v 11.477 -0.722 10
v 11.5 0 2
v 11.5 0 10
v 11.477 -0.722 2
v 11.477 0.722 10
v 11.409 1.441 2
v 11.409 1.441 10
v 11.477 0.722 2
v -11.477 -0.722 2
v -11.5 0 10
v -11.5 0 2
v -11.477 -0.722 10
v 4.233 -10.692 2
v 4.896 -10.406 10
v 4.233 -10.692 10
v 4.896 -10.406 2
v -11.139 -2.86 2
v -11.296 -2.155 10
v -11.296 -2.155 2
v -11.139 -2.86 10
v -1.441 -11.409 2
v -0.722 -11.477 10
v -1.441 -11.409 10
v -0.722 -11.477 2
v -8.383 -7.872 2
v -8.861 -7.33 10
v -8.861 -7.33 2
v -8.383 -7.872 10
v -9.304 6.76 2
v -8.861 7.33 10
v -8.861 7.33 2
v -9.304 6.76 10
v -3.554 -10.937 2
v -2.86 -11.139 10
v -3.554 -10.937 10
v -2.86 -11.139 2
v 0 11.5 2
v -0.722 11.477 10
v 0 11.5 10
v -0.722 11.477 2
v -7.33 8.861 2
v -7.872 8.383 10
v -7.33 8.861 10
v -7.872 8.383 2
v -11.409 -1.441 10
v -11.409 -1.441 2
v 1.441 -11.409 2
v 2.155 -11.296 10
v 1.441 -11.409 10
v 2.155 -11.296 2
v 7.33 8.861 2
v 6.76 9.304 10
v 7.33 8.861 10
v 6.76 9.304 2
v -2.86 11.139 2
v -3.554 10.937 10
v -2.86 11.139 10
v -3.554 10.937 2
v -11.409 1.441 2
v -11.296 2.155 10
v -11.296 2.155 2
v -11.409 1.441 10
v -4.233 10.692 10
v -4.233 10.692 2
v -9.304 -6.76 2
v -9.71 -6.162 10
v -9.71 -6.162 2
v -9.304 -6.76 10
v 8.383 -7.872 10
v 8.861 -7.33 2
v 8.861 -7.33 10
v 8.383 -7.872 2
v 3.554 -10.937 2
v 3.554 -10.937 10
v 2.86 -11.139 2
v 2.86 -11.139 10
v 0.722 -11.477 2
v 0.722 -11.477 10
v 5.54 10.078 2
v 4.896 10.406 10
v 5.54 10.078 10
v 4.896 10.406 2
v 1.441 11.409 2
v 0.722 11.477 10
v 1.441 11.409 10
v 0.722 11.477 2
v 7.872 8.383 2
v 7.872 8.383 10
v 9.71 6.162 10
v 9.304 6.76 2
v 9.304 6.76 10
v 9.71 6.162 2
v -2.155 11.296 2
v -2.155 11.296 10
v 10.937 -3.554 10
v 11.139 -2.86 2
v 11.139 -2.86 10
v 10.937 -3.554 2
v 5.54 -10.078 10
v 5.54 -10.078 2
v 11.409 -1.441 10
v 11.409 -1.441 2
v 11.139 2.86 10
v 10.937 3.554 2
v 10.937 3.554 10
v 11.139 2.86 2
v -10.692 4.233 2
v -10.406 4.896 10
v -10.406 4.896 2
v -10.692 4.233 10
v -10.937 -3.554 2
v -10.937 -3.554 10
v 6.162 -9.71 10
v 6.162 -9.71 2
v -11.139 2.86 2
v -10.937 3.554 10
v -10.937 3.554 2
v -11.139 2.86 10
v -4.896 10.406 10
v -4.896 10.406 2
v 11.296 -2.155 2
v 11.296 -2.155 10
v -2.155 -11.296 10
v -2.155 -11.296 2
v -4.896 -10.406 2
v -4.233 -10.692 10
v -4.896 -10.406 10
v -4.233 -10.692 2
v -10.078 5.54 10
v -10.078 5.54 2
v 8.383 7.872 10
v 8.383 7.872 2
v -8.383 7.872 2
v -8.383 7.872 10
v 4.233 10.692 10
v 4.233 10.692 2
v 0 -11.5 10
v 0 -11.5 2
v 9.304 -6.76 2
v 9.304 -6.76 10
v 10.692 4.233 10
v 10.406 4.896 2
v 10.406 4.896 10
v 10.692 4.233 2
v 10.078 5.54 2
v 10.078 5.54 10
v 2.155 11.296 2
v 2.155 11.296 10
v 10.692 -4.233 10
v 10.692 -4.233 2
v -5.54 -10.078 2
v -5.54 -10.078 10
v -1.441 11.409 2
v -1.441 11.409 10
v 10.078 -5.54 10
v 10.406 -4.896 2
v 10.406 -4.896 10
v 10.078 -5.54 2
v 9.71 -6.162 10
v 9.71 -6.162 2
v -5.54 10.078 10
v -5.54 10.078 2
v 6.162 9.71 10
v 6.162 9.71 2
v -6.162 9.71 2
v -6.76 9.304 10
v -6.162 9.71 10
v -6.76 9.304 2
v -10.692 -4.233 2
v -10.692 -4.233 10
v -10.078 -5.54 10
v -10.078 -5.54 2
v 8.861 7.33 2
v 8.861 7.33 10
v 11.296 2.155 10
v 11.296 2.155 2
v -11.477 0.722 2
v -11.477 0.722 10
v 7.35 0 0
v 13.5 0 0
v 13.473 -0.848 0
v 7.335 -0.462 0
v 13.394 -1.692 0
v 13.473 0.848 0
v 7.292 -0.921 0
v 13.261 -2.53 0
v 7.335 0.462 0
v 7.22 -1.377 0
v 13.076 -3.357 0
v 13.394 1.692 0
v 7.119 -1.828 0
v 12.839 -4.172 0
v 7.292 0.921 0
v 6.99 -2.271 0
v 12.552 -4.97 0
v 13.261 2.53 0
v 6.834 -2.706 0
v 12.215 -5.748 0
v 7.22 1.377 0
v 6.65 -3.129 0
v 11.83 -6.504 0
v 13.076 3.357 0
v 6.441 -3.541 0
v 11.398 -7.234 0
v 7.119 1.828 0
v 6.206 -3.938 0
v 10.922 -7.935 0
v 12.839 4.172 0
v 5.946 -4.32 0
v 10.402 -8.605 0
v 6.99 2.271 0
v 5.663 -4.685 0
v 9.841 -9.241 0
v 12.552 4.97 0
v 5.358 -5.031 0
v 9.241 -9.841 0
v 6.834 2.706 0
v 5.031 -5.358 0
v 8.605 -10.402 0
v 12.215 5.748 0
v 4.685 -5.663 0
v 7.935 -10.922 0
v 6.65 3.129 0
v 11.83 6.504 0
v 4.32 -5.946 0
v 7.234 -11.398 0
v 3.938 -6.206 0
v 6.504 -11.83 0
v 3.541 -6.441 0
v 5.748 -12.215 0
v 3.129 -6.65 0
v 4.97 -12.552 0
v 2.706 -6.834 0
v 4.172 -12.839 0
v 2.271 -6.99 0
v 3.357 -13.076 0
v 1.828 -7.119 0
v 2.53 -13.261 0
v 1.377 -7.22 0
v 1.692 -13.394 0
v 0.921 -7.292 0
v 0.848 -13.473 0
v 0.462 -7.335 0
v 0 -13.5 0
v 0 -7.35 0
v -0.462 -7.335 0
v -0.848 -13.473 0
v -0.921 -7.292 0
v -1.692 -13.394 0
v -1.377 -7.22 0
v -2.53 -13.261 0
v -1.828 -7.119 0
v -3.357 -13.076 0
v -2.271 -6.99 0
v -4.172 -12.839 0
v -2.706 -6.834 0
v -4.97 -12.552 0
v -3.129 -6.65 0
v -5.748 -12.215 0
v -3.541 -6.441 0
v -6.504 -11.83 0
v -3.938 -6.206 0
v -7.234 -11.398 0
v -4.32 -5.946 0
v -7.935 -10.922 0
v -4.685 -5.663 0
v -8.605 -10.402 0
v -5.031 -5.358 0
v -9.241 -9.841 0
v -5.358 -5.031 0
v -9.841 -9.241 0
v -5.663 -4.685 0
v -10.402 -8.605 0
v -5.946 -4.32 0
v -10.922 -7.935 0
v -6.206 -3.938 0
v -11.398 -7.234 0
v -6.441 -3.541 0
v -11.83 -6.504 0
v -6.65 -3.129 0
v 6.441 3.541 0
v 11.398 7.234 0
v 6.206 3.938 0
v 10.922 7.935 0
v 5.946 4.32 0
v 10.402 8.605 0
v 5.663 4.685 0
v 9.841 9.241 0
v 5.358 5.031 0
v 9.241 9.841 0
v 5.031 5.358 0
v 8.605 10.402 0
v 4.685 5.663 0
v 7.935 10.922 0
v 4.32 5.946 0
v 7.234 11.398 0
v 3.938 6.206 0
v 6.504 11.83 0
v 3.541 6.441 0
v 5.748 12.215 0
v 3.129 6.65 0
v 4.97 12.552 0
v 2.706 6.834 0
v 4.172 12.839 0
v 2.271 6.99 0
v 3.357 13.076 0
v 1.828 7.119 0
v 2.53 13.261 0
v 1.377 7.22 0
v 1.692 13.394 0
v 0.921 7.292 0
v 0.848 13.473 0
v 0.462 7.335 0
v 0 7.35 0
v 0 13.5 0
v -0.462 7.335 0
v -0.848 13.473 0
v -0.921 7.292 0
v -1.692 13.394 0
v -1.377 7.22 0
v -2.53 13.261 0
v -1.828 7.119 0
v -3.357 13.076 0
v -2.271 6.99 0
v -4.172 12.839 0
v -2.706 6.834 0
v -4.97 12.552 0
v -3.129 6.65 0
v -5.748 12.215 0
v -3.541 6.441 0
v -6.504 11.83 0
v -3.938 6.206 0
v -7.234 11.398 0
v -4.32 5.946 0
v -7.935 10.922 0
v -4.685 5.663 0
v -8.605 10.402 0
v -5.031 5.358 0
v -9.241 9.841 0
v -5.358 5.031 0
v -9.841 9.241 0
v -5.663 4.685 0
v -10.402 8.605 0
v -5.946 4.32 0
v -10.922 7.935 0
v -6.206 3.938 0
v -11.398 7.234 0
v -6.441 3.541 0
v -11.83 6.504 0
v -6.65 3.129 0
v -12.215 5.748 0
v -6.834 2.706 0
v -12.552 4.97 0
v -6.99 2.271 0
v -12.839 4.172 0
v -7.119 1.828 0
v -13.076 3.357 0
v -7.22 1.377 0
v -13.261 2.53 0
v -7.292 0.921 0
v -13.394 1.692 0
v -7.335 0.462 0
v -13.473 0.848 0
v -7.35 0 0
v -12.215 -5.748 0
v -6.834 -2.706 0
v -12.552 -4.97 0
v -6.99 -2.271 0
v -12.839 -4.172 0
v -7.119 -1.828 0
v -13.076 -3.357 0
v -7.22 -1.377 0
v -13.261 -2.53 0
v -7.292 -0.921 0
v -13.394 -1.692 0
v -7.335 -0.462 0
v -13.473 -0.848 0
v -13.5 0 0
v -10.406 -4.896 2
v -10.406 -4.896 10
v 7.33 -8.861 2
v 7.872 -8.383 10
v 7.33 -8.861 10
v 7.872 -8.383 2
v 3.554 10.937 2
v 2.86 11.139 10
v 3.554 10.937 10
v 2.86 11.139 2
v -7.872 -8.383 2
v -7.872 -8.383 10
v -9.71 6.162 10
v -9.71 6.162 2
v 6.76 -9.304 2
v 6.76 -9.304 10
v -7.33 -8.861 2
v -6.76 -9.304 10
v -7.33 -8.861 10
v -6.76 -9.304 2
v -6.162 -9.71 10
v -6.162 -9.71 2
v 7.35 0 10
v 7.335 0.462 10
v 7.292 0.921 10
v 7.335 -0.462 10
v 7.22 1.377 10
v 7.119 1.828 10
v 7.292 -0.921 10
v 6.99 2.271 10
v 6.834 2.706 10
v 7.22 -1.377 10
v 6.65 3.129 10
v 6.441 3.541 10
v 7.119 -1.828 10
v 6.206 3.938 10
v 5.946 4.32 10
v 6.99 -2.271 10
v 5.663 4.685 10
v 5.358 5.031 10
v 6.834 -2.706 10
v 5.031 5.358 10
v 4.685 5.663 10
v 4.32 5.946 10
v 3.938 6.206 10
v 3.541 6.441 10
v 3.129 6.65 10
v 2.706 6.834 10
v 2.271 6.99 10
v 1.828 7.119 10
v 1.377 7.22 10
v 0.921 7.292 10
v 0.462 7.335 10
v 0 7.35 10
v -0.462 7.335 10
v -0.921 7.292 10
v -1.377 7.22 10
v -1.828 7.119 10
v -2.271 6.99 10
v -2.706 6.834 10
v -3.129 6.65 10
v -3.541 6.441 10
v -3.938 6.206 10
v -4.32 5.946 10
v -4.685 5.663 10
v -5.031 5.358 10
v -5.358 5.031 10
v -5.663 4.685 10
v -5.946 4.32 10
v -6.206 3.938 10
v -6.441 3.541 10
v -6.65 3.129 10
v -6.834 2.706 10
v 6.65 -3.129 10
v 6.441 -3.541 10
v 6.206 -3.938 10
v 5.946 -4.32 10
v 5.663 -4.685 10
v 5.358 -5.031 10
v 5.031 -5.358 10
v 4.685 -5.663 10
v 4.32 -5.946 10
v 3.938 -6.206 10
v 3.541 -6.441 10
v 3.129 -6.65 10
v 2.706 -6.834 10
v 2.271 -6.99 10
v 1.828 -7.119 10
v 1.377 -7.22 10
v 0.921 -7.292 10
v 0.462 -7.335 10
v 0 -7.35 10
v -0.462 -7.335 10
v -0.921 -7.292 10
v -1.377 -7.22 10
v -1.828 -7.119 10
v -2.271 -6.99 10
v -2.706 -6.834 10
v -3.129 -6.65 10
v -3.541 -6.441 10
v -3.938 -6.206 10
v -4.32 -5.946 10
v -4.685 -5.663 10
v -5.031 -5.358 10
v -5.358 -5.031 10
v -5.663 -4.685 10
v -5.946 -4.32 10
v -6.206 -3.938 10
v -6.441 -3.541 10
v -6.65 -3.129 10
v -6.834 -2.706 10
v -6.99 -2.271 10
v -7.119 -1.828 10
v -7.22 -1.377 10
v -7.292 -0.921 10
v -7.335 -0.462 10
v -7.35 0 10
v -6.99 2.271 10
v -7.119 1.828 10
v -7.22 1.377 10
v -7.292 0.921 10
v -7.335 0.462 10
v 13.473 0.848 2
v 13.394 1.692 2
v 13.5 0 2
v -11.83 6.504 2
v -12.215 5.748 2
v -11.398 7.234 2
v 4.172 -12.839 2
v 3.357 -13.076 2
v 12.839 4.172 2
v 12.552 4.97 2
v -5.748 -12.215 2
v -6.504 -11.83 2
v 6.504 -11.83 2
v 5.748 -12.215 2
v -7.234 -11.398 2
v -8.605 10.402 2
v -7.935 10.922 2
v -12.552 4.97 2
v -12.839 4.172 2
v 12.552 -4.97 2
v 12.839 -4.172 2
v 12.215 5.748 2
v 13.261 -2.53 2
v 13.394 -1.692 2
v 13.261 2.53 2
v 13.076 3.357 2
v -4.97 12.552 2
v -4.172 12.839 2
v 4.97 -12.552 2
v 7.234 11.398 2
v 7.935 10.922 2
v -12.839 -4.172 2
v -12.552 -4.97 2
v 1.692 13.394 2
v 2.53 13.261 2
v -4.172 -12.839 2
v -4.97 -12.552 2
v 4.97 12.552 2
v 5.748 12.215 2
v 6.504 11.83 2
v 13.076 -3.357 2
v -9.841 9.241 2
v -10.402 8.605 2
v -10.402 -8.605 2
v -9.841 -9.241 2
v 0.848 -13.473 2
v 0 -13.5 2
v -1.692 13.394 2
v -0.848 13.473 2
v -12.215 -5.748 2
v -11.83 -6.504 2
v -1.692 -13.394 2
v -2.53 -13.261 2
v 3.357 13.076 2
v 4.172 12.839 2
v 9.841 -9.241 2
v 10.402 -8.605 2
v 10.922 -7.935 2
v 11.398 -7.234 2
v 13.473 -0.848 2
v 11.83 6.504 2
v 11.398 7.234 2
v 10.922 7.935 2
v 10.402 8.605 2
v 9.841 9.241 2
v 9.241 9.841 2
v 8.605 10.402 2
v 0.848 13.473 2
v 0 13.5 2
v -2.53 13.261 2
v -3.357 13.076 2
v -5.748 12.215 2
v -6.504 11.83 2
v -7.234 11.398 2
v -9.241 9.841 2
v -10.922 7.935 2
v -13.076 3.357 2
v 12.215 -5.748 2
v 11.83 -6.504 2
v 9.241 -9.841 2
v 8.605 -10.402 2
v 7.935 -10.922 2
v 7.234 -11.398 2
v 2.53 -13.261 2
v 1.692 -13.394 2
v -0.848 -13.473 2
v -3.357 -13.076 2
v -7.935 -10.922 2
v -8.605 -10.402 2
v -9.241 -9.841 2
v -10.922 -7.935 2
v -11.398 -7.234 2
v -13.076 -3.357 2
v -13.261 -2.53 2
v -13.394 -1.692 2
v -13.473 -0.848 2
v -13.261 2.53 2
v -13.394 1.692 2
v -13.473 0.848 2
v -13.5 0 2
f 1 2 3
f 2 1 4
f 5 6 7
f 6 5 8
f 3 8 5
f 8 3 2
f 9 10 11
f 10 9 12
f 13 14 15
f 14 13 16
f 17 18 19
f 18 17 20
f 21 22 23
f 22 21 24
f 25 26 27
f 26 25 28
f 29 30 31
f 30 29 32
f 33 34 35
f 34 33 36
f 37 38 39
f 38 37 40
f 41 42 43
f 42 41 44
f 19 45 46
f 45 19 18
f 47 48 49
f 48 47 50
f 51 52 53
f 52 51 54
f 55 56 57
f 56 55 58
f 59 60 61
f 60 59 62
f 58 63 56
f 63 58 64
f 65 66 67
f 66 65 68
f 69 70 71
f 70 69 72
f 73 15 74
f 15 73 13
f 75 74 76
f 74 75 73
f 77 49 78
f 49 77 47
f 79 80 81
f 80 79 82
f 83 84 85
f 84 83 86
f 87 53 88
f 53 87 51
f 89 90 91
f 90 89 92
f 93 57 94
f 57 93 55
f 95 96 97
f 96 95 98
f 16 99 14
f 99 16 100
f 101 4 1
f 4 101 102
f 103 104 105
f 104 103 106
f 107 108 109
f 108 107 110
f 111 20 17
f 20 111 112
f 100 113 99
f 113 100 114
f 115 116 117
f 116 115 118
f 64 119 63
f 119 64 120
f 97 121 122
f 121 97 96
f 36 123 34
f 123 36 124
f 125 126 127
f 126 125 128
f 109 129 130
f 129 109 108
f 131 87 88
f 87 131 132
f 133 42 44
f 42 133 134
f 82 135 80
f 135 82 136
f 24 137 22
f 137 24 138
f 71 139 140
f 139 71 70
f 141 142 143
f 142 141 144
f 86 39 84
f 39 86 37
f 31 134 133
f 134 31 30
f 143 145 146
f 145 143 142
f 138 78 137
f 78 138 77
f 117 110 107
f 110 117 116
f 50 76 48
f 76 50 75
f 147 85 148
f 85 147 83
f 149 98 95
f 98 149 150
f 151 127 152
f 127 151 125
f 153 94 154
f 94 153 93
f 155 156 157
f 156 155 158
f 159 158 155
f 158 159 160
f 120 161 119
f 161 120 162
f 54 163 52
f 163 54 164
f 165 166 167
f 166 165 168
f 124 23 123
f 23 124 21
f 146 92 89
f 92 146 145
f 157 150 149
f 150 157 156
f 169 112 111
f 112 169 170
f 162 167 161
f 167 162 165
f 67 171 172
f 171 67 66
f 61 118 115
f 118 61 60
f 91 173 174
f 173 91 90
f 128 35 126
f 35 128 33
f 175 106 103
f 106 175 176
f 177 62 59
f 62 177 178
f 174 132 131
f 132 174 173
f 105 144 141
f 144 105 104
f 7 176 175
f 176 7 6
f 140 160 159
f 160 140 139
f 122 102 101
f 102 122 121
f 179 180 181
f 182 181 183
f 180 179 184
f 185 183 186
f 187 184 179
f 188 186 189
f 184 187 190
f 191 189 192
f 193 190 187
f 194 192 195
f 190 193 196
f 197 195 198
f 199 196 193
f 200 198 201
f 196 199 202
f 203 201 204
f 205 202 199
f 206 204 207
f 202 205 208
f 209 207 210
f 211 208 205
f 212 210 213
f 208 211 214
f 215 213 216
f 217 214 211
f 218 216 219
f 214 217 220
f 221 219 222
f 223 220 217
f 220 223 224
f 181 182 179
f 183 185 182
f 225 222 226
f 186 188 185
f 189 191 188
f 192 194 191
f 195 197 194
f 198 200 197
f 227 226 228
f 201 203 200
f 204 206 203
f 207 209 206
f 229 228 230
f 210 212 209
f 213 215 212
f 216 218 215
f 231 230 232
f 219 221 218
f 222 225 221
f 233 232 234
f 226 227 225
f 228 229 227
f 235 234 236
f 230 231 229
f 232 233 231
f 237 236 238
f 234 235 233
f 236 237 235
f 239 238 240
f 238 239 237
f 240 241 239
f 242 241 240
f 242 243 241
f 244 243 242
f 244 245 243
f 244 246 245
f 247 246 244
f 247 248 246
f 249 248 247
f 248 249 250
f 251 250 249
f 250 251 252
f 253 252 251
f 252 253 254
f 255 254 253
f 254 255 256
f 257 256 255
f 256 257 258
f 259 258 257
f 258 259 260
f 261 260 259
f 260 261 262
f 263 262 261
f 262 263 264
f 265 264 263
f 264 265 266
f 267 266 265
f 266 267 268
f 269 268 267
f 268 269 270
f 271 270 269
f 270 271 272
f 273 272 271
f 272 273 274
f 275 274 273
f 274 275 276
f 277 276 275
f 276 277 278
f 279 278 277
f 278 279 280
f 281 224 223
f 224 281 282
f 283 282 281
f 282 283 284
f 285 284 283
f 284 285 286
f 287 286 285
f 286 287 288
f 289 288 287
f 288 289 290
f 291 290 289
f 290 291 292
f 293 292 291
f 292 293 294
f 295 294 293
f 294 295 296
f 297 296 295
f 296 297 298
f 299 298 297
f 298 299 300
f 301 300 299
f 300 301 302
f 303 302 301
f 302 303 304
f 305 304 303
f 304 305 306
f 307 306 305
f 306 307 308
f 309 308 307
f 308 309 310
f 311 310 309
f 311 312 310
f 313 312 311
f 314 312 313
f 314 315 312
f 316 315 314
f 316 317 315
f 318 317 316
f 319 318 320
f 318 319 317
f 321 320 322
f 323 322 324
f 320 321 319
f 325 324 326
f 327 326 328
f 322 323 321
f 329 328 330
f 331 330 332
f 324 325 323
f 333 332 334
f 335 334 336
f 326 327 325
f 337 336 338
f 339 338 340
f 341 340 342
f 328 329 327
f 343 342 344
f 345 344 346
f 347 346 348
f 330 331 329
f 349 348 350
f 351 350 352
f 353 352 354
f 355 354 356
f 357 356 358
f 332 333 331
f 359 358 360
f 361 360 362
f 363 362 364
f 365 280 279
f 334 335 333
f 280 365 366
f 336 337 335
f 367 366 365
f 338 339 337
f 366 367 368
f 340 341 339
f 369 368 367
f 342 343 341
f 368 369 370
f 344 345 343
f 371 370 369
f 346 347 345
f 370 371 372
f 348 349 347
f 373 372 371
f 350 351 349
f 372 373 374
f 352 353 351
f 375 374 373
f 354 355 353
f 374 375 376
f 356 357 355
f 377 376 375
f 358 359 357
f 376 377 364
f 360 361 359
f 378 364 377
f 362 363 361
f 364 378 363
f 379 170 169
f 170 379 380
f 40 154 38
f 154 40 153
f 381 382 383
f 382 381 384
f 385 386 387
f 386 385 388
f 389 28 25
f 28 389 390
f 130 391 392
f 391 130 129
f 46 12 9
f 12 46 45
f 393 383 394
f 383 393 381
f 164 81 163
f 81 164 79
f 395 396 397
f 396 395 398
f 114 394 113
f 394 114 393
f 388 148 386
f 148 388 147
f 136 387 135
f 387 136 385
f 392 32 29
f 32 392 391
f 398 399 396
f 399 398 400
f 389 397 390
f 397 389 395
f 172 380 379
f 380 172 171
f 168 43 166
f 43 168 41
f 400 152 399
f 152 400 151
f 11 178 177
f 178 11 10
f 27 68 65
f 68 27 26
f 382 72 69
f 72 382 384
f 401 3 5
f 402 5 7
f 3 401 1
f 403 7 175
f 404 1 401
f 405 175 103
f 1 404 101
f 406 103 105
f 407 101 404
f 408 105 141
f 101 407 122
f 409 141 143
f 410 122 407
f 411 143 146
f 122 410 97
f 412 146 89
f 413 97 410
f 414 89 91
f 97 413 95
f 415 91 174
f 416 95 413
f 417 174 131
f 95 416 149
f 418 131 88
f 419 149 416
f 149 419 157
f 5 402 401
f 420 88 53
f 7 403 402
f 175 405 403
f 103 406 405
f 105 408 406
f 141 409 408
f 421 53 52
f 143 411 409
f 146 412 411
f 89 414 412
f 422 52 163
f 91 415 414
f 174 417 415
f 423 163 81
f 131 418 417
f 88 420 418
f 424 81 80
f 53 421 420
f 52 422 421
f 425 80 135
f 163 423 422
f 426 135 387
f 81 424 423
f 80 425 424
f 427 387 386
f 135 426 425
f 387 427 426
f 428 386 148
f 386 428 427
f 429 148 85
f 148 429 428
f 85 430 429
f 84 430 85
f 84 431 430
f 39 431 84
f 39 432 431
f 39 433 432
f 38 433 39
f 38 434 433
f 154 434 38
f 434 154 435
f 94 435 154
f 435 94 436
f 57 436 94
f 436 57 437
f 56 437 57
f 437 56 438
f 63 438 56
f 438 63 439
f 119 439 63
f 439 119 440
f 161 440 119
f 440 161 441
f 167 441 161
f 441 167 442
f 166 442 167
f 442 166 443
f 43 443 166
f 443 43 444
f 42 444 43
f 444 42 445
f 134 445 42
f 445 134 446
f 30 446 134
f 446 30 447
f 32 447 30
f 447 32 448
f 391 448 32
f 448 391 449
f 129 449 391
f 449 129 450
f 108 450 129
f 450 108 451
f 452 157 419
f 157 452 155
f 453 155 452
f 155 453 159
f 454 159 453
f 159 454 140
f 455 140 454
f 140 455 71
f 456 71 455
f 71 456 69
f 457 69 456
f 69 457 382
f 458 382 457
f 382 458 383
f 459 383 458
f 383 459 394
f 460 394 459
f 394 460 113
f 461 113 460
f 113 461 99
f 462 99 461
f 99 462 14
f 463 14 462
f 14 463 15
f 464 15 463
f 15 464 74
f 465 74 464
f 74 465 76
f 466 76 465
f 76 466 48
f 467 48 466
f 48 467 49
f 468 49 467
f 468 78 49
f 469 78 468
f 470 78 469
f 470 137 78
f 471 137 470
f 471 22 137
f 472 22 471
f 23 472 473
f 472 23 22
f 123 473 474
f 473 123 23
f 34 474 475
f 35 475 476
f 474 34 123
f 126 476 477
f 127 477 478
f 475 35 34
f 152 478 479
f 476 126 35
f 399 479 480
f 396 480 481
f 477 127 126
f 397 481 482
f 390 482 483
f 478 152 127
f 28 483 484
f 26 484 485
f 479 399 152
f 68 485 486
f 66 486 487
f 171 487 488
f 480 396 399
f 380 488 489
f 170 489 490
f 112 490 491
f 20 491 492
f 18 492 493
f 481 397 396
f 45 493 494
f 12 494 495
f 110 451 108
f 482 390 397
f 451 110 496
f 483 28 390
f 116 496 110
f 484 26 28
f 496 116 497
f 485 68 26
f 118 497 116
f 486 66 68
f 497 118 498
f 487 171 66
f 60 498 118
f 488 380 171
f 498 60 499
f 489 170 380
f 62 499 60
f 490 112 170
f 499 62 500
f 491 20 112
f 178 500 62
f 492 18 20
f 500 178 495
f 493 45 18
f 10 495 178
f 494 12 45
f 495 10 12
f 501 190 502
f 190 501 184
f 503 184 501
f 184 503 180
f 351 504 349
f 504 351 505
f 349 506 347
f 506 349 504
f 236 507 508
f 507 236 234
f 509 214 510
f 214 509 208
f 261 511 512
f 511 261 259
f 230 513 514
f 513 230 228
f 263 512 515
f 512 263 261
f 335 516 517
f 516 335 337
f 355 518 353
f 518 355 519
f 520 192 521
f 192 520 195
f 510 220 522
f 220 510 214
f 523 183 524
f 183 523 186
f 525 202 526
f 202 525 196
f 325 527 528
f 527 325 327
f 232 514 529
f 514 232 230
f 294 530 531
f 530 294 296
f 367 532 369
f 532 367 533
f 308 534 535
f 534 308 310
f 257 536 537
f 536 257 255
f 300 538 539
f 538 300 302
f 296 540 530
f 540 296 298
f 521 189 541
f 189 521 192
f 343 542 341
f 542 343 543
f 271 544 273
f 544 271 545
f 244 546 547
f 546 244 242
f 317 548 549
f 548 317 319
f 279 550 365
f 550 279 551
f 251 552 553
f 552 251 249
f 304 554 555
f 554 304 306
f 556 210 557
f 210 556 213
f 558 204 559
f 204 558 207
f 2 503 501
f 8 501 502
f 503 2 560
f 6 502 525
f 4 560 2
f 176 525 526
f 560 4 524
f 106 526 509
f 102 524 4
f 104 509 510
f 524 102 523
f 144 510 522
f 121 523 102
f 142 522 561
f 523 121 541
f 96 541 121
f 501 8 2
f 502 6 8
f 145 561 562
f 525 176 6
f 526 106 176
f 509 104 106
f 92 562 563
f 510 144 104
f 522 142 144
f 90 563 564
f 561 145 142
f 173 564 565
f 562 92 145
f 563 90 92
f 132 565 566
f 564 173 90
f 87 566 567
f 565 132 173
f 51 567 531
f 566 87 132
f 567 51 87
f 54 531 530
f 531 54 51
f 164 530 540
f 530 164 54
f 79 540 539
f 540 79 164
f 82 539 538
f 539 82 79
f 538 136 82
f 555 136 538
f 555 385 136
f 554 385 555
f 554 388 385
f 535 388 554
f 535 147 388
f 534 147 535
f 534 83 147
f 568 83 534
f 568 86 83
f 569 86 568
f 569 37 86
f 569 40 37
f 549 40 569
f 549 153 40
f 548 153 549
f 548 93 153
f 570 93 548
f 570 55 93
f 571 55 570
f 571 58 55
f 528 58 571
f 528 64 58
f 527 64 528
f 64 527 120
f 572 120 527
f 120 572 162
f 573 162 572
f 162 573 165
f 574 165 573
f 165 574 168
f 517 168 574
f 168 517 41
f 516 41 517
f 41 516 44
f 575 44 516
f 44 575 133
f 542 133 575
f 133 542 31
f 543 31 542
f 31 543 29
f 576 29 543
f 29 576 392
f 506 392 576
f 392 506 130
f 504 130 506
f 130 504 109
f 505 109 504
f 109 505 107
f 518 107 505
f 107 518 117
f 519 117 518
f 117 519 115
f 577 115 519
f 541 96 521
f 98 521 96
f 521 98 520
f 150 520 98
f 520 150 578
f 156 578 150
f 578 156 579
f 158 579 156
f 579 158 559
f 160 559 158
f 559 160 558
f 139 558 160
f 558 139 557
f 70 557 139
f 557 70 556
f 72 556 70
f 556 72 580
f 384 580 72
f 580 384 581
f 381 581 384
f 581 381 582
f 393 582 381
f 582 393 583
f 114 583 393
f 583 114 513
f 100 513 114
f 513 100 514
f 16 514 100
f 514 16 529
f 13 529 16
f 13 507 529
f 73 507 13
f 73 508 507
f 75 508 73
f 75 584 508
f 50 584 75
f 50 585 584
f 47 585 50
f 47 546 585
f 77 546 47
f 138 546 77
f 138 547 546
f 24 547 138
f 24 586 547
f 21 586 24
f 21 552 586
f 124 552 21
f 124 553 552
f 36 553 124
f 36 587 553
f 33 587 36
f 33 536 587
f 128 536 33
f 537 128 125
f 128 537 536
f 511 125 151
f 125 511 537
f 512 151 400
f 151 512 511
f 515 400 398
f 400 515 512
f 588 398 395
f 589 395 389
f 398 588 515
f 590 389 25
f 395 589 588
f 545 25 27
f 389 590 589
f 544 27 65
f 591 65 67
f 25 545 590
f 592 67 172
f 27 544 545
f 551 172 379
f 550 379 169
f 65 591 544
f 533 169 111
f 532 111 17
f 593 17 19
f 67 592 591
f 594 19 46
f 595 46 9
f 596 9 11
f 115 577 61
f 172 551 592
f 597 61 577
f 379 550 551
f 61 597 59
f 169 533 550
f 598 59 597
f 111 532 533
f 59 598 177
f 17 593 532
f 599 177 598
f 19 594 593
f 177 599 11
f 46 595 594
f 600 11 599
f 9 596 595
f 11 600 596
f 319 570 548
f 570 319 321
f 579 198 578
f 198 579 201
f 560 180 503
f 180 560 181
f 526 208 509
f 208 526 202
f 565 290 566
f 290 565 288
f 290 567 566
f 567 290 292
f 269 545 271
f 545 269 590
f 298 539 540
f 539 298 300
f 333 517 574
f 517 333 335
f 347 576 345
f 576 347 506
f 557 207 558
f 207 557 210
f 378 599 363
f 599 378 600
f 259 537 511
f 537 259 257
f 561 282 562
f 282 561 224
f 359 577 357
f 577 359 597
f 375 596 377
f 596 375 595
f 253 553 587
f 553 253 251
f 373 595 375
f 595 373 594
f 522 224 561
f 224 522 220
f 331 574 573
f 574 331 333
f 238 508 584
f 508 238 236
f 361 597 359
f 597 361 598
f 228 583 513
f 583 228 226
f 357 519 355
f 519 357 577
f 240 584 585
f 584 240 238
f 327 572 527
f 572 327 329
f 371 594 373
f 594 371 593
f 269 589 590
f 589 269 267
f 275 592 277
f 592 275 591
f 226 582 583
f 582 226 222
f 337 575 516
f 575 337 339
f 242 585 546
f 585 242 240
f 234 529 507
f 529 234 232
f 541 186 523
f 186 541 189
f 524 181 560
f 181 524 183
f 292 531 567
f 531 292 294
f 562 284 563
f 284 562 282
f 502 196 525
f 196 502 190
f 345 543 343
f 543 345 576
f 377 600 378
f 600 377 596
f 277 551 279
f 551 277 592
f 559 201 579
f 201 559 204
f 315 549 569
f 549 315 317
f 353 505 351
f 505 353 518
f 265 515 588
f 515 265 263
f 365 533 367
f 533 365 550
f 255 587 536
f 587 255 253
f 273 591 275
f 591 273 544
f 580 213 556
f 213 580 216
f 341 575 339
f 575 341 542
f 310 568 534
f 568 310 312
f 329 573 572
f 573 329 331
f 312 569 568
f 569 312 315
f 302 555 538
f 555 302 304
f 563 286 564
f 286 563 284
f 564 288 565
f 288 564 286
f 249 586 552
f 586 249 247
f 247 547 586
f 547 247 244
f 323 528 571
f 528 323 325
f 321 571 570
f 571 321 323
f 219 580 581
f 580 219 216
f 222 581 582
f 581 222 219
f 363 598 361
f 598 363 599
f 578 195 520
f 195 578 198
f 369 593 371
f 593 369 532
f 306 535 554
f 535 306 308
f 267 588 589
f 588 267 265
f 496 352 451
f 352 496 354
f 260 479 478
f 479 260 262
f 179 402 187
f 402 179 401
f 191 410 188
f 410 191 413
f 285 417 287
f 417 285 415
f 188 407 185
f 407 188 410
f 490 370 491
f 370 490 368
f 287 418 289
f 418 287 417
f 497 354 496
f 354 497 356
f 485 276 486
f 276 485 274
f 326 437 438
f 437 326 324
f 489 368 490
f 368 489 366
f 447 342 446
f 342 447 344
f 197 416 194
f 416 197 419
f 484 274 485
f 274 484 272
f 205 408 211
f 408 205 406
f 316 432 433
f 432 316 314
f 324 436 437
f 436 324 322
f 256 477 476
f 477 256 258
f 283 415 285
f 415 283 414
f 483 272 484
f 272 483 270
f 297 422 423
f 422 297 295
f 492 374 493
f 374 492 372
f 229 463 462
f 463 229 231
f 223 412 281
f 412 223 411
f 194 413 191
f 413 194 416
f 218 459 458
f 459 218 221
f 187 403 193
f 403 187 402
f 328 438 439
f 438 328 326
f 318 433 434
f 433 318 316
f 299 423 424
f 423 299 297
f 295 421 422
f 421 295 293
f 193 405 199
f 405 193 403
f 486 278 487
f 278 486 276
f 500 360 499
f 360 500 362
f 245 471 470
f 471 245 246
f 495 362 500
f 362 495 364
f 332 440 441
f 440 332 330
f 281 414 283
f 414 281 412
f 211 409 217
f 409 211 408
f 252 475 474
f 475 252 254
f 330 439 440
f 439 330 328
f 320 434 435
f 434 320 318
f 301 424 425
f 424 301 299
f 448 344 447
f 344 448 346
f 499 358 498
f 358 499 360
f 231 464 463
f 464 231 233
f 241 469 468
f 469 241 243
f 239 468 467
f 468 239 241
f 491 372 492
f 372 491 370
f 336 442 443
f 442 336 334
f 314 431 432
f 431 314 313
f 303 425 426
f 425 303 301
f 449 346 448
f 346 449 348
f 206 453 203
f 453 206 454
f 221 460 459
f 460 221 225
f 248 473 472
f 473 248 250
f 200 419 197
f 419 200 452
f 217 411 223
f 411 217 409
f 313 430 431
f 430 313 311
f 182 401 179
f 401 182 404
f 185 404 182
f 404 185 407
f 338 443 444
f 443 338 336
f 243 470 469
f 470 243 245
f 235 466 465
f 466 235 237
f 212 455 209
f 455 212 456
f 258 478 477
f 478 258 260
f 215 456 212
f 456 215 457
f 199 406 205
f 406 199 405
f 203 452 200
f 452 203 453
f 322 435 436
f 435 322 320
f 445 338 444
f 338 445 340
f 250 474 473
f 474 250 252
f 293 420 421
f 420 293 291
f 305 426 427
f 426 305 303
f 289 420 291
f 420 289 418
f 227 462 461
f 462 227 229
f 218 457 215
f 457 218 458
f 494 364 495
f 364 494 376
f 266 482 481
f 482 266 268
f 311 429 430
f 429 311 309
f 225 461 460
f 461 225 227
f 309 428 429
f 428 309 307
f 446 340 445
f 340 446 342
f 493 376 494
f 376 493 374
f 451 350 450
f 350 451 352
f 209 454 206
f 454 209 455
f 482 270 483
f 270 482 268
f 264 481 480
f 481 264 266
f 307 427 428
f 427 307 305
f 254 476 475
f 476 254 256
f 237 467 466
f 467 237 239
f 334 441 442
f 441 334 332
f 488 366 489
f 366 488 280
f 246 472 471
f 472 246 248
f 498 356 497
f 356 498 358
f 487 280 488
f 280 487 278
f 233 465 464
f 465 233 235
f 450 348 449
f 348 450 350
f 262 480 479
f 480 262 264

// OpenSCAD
cameraTubeOuterDiameter = 14.2;
cameraTubeHeight = 10;
eyepieceTubeInnerDiameter = 23;
flangeHeight = 2;
flangeWidth = flangeHeight;
eyepieceCuffHeight = 20;
clearance = 0.25;

$fn = 100;
overcut = 0.01;
adapterDiameter = eyepieceTubeInnerDiameter; // clearance is microscope tube
adapterHeight = cameraTubeHeight;

difference() {
    union () {
        cylinder(h=adapterHeight, d=adapterDiameter);
        cylinder(h=flangeHeight, d=adapterDiameter + 2*flangeWidth);
    }
    translate([0,0,-overcut])
        cylinder(h=adapterHeight + 2*overcut, 
            d=cameraTubeOuterDiameter + 2*clearance);
}
